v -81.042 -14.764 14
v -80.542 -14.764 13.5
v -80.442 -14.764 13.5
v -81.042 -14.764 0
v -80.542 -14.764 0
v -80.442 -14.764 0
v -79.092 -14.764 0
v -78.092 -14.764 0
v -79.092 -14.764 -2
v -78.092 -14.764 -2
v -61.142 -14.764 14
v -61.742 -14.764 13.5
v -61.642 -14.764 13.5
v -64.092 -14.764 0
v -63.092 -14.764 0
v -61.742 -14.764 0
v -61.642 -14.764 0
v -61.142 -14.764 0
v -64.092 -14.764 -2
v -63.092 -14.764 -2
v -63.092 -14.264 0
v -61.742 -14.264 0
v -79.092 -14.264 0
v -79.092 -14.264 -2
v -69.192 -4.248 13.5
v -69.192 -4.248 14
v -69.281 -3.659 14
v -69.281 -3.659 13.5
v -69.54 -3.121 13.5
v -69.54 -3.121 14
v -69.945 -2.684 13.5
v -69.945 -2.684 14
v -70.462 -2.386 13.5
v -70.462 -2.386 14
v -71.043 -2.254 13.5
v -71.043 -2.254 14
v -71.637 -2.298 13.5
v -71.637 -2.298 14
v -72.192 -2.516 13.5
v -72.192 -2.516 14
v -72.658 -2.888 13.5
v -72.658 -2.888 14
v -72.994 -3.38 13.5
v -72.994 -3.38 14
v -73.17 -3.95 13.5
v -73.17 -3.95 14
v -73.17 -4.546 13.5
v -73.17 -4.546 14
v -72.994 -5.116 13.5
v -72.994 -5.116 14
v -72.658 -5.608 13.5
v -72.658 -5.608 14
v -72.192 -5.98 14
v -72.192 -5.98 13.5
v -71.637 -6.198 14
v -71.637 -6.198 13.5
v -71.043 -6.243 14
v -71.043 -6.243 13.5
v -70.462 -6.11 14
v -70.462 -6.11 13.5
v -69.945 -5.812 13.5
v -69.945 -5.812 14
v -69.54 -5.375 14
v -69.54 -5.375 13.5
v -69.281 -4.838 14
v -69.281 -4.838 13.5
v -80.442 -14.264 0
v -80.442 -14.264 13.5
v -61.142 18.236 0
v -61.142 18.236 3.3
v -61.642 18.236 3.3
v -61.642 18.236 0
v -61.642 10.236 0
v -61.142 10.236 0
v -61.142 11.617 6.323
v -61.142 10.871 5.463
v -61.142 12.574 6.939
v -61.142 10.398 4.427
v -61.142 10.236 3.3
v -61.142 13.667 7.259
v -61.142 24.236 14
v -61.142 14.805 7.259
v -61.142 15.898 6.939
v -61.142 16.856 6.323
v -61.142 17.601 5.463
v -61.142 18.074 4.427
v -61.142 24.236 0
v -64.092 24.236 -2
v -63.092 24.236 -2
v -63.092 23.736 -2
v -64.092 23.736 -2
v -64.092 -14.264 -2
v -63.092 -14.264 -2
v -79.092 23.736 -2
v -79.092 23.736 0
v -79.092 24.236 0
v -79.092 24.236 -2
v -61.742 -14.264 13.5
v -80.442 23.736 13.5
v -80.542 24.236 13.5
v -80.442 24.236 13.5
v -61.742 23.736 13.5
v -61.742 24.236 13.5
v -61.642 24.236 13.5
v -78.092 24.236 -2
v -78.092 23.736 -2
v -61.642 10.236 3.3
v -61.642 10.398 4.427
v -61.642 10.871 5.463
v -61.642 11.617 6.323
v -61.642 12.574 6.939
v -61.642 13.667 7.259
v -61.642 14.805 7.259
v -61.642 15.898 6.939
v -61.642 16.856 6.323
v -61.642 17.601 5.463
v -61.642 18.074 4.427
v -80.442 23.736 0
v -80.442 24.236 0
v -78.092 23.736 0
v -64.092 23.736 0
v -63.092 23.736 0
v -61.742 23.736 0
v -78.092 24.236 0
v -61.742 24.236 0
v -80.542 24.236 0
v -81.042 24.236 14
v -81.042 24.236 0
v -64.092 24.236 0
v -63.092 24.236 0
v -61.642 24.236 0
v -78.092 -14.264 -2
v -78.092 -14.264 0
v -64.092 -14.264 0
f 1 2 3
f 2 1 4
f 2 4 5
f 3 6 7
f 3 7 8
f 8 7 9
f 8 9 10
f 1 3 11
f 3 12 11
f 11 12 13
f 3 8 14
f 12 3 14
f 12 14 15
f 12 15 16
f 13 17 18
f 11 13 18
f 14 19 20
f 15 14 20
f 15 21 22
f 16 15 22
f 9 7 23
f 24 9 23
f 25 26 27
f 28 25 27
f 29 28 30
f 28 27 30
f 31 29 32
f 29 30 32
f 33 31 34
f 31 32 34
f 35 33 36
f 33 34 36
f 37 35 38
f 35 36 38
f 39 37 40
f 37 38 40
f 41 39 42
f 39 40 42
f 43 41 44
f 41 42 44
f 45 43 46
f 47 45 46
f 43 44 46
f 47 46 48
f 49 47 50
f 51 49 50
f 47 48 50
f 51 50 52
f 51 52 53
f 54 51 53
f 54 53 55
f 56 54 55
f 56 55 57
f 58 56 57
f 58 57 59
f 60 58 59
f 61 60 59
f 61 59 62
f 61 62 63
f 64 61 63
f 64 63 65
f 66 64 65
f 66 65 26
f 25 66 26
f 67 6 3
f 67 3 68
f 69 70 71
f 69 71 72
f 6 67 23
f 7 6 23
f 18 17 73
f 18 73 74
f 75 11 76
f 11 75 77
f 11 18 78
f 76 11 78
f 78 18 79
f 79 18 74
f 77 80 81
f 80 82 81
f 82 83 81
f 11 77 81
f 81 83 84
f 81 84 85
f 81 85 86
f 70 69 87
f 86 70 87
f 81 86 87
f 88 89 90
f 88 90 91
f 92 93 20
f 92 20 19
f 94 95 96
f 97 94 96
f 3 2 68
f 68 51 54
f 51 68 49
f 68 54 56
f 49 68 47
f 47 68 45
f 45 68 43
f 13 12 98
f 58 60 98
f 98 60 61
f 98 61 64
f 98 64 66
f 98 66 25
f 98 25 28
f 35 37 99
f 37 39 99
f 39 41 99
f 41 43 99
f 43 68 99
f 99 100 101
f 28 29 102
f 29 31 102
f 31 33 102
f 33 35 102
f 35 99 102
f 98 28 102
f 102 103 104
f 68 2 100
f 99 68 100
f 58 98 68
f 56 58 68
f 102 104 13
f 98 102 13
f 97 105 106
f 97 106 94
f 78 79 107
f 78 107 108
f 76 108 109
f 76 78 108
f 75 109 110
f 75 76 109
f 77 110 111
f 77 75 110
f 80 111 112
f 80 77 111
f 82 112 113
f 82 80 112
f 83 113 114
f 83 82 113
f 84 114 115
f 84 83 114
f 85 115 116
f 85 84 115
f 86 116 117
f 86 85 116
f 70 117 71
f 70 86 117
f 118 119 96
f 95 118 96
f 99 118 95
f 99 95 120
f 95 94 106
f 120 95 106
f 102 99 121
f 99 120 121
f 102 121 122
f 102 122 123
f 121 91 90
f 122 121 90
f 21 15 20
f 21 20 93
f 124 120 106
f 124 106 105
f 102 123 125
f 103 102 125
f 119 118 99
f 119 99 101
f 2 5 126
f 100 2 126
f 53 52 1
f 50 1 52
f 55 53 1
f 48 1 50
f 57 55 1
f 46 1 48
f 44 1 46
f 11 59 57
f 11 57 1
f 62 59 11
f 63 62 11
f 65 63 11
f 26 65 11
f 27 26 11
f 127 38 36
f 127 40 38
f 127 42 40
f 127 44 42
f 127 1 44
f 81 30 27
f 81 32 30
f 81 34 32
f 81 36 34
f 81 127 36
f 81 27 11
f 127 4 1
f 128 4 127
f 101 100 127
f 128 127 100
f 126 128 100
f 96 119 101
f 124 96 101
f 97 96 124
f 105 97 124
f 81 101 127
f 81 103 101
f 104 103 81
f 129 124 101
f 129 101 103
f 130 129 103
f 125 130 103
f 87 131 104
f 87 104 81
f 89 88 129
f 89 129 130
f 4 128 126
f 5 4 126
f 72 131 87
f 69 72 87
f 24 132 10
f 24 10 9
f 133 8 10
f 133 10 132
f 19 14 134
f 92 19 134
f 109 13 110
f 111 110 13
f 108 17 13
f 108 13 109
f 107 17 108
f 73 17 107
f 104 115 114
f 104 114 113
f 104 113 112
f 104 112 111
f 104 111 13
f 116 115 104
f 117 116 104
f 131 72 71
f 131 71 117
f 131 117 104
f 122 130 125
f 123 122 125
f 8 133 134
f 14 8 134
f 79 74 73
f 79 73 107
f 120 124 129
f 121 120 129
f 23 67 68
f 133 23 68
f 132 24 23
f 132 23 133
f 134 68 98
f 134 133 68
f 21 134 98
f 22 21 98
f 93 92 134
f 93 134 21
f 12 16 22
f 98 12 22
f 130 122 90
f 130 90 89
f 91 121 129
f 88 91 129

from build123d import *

# Parameters (mm, degrees)
ESQUISSE1_W             = 0.5
ESQUISSE1_H             = 39
EXTRUSION1_DEPTH        = 13.5
ESQUISSE1_W_2           = 18.7
ESQUISSE1_H_2           = 0.5
EXTRUSION1_2_DEPTH      = 13.5
EXTRUSION1_3_DEPTH      = 13.5
EXTRUSION1_4_DEPTH      = 13.5
ESQUISSE2_W             = 19.9
ESQUISSE2_H             = 39
EXTRUSION2_DEPTH        = 0.5
ENL_V_MAT_EXTRU_1_DEPTH = 10
ESQUISSE4_W             = 1
ESQUISSE4_H             = 0.5
EXTRUSION3_DEPTH        = 2
ESQUISSE5_R             = 2
ENL_V_MAT_EXTRU_2_DEPTH = 2


with BuildPart() as part:
    # Esquisse1 → Extrusion1 (new body)
    with BuildSketch(Plane.XY):
        with Locations((-80.79228109, 4.736105473)):
            Rectangle(ESQUISSE1_W, ESQUISSE1_H)
    extrude(amount=EXTRUSION1_DEPTH)



with BuildPart() as body_2:
    # Esquisse1 → Extrusion1 2 (new body)
    with BuildSketch(Plane.XY):
        with Locations((-71.09228109, 23.986105473)):
            Rectangle(ESQUISSE1_W_2, ESQUISSE1_H_2)
    extrude(amount=EXTRUSION1_2_DEPTH)


with BuildPart() as body_3:
    # Esquisse1 → Extrusion1 3 (new body)
    with BuildSketch(Plane.XY):
        with Locations((-61.39228109, 4.736105473)):
            Rectangle(ESQUISSE1_W, ESQUISSE1_H)
    extrude(amount=EXTRUSION1_3_DEPTH)


with BuildPart() as body_4:
    # Esquisse1 → Extrusion1 4 (new body)
    with BuildSketch(Plane.XY):
        with Locations((-71.09228109, -14.513894527)):
            Rectangle(ESQUISSE1_W_2, ESQUISSE1_H_2)
    extrude(amount=EXTRUSION1_4_DEPTH)


with BuildPart() as part_1:
    add(part.part)

    add(body_2.part)  # Extrusion2 merges body 2

    add(body_3.part)  # Extrusion2 merges body 3

    add(body_4.part)  # Extrusion2 merges body 4
    # Esquisse2 → Extrusion2 (add)
    with BuildSketch(Plane.XY.offset(13.5)):
        with Locations((-71.09228109, 4.736105473)):
            Rectangle(ESQUISSE2_W, ESQUISSE2_H)
    extrude(amount=EXTRUSION2_DEPTH)

    # Esquisse3 → Enlèv. mat.-Extru.1 (cut)
    with BuildSketch(Plane(origin=(-61.14228109, 0, 0), x_dir=(0, 0, -1), z_dir=(1, 0, 0))):
        with BuildLine():
            Line((0, 18.236105473), (0, 10.236105473))
            Line((0, 10.236105473), (-3.3, 10.236105473))
            ThreePointArc((-3.3, 10.236105473), (-7.3, 14.236105473), (-3.3, 18.236105473))
            Line((-3.3, 18.236105473), (0, 18.236105473))
        make_face()
    extrude(amount=-ENL_V_MAT_EXTRU_1_DEPTH, mode=Mode.SUBTRACT)

    # Esquisse4 → Extrusion3 (add)
    with BuildSketch(Plane(origin=(0, 0, 0), x_dir=(-1, 0, 0), z_dir=(0, 0, -1))):
        with Locations((63.59228109, 23.986105473)):
            Rectangle(ESQUISSE4_W, ESQUISSE4_H)
        with Locations((78.59228109, 23.986105473)):
            Rectangle(ESQUISSE4_W, ESQUISSE4_H)
        with Locations((63.59228109, -14.513894527)):
            Rectangle(ESQUISSE4_W, ESQUISSE4_H)
        with Locations((78.59228109, -14.513894527)):
            Rectangle(ESQUISSE4_W, ESQUISSE4_H)
    extrude(amount=EXTRUSION3_DEPTH)

    # Esquisse5 → Enlèv. mat.-Extru.2 (cut)
    with BuildSketch(Plane.XY.offset(14)):
        with Locations((-71.19228109, -4.248125646)):
            Circle(ESQUISSE5_R)
    extrude(amount=-ENL_V_MAT_EXTRU_2_DEPTH, mode=Mode.SUBTRACT)


solid = part_1.part
